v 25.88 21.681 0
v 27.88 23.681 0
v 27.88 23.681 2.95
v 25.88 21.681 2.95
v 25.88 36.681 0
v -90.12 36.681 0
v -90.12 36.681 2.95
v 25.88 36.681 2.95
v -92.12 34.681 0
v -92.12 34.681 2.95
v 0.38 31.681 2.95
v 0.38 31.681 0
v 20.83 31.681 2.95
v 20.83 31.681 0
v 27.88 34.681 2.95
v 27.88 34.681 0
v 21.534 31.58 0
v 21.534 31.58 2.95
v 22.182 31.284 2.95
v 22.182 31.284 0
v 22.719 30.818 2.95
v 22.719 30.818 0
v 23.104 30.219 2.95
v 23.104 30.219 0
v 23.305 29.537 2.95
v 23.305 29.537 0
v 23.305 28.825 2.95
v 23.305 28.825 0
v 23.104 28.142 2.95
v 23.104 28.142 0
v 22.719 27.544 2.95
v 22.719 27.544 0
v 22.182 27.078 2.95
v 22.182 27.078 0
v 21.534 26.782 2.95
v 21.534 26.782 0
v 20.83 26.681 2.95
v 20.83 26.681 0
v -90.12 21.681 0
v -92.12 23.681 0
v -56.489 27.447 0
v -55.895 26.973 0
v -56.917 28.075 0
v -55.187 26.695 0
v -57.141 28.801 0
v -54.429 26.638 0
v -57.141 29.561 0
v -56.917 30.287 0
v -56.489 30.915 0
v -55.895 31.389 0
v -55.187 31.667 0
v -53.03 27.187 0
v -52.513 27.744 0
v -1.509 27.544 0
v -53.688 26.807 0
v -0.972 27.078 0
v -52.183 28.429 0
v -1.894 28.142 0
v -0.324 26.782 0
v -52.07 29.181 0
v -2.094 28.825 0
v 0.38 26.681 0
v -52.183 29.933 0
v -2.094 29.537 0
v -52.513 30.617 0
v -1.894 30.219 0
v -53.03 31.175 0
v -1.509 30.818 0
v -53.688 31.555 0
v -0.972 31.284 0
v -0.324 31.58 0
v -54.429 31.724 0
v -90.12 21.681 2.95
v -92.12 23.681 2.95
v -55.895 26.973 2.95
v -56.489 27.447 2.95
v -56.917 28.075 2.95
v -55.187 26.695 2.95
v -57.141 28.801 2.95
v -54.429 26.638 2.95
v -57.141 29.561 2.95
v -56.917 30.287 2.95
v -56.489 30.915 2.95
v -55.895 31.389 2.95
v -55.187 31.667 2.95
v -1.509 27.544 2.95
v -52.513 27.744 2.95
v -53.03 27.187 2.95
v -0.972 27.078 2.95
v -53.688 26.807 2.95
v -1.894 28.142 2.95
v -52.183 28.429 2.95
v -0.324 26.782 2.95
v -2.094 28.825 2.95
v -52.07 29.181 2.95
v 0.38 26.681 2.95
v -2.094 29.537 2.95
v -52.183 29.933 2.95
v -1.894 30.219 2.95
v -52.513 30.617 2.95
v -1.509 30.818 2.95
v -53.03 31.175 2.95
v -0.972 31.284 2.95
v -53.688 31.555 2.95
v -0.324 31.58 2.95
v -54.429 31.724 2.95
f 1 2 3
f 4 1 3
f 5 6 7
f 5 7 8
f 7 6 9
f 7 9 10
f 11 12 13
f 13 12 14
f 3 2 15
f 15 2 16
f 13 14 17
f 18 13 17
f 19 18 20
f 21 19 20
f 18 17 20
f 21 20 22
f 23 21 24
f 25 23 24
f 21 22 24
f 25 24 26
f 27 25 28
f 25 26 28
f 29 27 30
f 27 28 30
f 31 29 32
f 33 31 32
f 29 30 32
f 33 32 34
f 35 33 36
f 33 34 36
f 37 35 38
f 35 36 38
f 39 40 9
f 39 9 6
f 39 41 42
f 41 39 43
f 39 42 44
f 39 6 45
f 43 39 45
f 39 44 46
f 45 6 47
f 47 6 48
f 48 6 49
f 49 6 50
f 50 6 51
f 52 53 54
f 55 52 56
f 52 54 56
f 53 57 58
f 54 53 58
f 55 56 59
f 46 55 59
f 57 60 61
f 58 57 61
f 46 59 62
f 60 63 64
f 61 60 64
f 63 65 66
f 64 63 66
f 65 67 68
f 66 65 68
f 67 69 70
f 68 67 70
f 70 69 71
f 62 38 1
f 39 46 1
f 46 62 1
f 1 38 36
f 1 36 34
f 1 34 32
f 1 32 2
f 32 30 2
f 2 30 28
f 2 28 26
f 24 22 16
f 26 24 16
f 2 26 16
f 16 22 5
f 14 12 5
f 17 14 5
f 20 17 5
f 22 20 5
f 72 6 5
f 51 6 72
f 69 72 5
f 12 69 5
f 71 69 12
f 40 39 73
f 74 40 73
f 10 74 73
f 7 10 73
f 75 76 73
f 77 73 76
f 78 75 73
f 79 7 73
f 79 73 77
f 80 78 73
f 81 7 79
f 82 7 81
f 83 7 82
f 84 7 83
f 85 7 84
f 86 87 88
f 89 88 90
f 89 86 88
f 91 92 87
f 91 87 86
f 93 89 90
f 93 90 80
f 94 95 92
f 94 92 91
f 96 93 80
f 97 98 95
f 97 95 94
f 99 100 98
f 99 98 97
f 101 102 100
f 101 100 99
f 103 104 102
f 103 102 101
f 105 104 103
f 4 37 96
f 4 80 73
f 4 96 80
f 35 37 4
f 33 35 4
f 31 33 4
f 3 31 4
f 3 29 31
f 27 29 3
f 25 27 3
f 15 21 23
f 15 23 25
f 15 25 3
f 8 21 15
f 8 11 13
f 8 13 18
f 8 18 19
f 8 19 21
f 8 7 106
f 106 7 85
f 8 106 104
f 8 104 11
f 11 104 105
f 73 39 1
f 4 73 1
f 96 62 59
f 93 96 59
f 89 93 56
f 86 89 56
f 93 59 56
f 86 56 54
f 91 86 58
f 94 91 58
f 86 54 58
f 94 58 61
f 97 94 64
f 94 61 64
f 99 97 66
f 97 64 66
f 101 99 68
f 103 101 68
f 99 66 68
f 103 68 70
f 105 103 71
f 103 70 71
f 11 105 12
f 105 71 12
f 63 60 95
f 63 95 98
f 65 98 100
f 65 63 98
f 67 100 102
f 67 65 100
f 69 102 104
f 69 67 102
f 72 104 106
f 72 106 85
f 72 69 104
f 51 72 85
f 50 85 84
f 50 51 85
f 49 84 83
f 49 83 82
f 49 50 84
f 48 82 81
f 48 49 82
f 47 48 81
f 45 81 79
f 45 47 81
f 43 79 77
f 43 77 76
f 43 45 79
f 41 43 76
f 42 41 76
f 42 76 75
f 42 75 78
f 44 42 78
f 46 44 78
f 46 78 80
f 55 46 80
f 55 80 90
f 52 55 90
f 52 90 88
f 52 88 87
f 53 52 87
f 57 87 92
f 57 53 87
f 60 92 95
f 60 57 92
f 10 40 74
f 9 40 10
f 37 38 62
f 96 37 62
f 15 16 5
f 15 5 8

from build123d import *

# Parameters (mm, degrees)
SKETCH1_W           = 120
SKETCH1_H           = 15
SKETCH1_R           = 2.55
BOSS_EXTRUDE1_DEPTH = 2.95
CHAMFER1_SIZE       = 2


with BuildPart() as part:
    # Sketch1 → Boss-Extrude1 (new body)
    with BuildSketch(Plane.XY):
        with Locations((-32.119914347, 29.180942184)):
            Rectangle(SKETCH1_W, SKETCH1_H)
        with Locations((-54.619914347, 29.180942184)):
            Circle(SKETCH1_R, mode=Mode.SUBTRACT)
        with BuildLine():
            Line((0.380085653, 31.680942184), (20.830085653, 31.680942184))
            ThreePointArc((20.830085653, 31.680942184), (23.330085653, 29.180942184), (20.830085653, 26.680942184))
            Line((20.830085653, 26.680942184), (0.380085653, 26.680942184))
            ThreePointArc((0.380085653, 26.680942184), (-2.119914347, 29.180942184), (0.380085653, 31.680942184))
        make_face(mode=Mode.SUBTRACT)
    extrude(amount=BOSS_EXTRUDE1_DEPTH)

    # Chamfer1
    chamfer1_edges = [part.edges().sort_by_distance(p)[0] for p in [
        (27.880085653, 21.680942184, 1.475),
        (-92.119914347, 21.680942184, 1.475),
        (-92.119914347, 36.680942184, 1.475),
        (27.880085653, 36.680942184, 1.475),
    ]]
    chamfer(chamfer1_edges, length=CHAMFER1_SIZE)


solid = part.part
